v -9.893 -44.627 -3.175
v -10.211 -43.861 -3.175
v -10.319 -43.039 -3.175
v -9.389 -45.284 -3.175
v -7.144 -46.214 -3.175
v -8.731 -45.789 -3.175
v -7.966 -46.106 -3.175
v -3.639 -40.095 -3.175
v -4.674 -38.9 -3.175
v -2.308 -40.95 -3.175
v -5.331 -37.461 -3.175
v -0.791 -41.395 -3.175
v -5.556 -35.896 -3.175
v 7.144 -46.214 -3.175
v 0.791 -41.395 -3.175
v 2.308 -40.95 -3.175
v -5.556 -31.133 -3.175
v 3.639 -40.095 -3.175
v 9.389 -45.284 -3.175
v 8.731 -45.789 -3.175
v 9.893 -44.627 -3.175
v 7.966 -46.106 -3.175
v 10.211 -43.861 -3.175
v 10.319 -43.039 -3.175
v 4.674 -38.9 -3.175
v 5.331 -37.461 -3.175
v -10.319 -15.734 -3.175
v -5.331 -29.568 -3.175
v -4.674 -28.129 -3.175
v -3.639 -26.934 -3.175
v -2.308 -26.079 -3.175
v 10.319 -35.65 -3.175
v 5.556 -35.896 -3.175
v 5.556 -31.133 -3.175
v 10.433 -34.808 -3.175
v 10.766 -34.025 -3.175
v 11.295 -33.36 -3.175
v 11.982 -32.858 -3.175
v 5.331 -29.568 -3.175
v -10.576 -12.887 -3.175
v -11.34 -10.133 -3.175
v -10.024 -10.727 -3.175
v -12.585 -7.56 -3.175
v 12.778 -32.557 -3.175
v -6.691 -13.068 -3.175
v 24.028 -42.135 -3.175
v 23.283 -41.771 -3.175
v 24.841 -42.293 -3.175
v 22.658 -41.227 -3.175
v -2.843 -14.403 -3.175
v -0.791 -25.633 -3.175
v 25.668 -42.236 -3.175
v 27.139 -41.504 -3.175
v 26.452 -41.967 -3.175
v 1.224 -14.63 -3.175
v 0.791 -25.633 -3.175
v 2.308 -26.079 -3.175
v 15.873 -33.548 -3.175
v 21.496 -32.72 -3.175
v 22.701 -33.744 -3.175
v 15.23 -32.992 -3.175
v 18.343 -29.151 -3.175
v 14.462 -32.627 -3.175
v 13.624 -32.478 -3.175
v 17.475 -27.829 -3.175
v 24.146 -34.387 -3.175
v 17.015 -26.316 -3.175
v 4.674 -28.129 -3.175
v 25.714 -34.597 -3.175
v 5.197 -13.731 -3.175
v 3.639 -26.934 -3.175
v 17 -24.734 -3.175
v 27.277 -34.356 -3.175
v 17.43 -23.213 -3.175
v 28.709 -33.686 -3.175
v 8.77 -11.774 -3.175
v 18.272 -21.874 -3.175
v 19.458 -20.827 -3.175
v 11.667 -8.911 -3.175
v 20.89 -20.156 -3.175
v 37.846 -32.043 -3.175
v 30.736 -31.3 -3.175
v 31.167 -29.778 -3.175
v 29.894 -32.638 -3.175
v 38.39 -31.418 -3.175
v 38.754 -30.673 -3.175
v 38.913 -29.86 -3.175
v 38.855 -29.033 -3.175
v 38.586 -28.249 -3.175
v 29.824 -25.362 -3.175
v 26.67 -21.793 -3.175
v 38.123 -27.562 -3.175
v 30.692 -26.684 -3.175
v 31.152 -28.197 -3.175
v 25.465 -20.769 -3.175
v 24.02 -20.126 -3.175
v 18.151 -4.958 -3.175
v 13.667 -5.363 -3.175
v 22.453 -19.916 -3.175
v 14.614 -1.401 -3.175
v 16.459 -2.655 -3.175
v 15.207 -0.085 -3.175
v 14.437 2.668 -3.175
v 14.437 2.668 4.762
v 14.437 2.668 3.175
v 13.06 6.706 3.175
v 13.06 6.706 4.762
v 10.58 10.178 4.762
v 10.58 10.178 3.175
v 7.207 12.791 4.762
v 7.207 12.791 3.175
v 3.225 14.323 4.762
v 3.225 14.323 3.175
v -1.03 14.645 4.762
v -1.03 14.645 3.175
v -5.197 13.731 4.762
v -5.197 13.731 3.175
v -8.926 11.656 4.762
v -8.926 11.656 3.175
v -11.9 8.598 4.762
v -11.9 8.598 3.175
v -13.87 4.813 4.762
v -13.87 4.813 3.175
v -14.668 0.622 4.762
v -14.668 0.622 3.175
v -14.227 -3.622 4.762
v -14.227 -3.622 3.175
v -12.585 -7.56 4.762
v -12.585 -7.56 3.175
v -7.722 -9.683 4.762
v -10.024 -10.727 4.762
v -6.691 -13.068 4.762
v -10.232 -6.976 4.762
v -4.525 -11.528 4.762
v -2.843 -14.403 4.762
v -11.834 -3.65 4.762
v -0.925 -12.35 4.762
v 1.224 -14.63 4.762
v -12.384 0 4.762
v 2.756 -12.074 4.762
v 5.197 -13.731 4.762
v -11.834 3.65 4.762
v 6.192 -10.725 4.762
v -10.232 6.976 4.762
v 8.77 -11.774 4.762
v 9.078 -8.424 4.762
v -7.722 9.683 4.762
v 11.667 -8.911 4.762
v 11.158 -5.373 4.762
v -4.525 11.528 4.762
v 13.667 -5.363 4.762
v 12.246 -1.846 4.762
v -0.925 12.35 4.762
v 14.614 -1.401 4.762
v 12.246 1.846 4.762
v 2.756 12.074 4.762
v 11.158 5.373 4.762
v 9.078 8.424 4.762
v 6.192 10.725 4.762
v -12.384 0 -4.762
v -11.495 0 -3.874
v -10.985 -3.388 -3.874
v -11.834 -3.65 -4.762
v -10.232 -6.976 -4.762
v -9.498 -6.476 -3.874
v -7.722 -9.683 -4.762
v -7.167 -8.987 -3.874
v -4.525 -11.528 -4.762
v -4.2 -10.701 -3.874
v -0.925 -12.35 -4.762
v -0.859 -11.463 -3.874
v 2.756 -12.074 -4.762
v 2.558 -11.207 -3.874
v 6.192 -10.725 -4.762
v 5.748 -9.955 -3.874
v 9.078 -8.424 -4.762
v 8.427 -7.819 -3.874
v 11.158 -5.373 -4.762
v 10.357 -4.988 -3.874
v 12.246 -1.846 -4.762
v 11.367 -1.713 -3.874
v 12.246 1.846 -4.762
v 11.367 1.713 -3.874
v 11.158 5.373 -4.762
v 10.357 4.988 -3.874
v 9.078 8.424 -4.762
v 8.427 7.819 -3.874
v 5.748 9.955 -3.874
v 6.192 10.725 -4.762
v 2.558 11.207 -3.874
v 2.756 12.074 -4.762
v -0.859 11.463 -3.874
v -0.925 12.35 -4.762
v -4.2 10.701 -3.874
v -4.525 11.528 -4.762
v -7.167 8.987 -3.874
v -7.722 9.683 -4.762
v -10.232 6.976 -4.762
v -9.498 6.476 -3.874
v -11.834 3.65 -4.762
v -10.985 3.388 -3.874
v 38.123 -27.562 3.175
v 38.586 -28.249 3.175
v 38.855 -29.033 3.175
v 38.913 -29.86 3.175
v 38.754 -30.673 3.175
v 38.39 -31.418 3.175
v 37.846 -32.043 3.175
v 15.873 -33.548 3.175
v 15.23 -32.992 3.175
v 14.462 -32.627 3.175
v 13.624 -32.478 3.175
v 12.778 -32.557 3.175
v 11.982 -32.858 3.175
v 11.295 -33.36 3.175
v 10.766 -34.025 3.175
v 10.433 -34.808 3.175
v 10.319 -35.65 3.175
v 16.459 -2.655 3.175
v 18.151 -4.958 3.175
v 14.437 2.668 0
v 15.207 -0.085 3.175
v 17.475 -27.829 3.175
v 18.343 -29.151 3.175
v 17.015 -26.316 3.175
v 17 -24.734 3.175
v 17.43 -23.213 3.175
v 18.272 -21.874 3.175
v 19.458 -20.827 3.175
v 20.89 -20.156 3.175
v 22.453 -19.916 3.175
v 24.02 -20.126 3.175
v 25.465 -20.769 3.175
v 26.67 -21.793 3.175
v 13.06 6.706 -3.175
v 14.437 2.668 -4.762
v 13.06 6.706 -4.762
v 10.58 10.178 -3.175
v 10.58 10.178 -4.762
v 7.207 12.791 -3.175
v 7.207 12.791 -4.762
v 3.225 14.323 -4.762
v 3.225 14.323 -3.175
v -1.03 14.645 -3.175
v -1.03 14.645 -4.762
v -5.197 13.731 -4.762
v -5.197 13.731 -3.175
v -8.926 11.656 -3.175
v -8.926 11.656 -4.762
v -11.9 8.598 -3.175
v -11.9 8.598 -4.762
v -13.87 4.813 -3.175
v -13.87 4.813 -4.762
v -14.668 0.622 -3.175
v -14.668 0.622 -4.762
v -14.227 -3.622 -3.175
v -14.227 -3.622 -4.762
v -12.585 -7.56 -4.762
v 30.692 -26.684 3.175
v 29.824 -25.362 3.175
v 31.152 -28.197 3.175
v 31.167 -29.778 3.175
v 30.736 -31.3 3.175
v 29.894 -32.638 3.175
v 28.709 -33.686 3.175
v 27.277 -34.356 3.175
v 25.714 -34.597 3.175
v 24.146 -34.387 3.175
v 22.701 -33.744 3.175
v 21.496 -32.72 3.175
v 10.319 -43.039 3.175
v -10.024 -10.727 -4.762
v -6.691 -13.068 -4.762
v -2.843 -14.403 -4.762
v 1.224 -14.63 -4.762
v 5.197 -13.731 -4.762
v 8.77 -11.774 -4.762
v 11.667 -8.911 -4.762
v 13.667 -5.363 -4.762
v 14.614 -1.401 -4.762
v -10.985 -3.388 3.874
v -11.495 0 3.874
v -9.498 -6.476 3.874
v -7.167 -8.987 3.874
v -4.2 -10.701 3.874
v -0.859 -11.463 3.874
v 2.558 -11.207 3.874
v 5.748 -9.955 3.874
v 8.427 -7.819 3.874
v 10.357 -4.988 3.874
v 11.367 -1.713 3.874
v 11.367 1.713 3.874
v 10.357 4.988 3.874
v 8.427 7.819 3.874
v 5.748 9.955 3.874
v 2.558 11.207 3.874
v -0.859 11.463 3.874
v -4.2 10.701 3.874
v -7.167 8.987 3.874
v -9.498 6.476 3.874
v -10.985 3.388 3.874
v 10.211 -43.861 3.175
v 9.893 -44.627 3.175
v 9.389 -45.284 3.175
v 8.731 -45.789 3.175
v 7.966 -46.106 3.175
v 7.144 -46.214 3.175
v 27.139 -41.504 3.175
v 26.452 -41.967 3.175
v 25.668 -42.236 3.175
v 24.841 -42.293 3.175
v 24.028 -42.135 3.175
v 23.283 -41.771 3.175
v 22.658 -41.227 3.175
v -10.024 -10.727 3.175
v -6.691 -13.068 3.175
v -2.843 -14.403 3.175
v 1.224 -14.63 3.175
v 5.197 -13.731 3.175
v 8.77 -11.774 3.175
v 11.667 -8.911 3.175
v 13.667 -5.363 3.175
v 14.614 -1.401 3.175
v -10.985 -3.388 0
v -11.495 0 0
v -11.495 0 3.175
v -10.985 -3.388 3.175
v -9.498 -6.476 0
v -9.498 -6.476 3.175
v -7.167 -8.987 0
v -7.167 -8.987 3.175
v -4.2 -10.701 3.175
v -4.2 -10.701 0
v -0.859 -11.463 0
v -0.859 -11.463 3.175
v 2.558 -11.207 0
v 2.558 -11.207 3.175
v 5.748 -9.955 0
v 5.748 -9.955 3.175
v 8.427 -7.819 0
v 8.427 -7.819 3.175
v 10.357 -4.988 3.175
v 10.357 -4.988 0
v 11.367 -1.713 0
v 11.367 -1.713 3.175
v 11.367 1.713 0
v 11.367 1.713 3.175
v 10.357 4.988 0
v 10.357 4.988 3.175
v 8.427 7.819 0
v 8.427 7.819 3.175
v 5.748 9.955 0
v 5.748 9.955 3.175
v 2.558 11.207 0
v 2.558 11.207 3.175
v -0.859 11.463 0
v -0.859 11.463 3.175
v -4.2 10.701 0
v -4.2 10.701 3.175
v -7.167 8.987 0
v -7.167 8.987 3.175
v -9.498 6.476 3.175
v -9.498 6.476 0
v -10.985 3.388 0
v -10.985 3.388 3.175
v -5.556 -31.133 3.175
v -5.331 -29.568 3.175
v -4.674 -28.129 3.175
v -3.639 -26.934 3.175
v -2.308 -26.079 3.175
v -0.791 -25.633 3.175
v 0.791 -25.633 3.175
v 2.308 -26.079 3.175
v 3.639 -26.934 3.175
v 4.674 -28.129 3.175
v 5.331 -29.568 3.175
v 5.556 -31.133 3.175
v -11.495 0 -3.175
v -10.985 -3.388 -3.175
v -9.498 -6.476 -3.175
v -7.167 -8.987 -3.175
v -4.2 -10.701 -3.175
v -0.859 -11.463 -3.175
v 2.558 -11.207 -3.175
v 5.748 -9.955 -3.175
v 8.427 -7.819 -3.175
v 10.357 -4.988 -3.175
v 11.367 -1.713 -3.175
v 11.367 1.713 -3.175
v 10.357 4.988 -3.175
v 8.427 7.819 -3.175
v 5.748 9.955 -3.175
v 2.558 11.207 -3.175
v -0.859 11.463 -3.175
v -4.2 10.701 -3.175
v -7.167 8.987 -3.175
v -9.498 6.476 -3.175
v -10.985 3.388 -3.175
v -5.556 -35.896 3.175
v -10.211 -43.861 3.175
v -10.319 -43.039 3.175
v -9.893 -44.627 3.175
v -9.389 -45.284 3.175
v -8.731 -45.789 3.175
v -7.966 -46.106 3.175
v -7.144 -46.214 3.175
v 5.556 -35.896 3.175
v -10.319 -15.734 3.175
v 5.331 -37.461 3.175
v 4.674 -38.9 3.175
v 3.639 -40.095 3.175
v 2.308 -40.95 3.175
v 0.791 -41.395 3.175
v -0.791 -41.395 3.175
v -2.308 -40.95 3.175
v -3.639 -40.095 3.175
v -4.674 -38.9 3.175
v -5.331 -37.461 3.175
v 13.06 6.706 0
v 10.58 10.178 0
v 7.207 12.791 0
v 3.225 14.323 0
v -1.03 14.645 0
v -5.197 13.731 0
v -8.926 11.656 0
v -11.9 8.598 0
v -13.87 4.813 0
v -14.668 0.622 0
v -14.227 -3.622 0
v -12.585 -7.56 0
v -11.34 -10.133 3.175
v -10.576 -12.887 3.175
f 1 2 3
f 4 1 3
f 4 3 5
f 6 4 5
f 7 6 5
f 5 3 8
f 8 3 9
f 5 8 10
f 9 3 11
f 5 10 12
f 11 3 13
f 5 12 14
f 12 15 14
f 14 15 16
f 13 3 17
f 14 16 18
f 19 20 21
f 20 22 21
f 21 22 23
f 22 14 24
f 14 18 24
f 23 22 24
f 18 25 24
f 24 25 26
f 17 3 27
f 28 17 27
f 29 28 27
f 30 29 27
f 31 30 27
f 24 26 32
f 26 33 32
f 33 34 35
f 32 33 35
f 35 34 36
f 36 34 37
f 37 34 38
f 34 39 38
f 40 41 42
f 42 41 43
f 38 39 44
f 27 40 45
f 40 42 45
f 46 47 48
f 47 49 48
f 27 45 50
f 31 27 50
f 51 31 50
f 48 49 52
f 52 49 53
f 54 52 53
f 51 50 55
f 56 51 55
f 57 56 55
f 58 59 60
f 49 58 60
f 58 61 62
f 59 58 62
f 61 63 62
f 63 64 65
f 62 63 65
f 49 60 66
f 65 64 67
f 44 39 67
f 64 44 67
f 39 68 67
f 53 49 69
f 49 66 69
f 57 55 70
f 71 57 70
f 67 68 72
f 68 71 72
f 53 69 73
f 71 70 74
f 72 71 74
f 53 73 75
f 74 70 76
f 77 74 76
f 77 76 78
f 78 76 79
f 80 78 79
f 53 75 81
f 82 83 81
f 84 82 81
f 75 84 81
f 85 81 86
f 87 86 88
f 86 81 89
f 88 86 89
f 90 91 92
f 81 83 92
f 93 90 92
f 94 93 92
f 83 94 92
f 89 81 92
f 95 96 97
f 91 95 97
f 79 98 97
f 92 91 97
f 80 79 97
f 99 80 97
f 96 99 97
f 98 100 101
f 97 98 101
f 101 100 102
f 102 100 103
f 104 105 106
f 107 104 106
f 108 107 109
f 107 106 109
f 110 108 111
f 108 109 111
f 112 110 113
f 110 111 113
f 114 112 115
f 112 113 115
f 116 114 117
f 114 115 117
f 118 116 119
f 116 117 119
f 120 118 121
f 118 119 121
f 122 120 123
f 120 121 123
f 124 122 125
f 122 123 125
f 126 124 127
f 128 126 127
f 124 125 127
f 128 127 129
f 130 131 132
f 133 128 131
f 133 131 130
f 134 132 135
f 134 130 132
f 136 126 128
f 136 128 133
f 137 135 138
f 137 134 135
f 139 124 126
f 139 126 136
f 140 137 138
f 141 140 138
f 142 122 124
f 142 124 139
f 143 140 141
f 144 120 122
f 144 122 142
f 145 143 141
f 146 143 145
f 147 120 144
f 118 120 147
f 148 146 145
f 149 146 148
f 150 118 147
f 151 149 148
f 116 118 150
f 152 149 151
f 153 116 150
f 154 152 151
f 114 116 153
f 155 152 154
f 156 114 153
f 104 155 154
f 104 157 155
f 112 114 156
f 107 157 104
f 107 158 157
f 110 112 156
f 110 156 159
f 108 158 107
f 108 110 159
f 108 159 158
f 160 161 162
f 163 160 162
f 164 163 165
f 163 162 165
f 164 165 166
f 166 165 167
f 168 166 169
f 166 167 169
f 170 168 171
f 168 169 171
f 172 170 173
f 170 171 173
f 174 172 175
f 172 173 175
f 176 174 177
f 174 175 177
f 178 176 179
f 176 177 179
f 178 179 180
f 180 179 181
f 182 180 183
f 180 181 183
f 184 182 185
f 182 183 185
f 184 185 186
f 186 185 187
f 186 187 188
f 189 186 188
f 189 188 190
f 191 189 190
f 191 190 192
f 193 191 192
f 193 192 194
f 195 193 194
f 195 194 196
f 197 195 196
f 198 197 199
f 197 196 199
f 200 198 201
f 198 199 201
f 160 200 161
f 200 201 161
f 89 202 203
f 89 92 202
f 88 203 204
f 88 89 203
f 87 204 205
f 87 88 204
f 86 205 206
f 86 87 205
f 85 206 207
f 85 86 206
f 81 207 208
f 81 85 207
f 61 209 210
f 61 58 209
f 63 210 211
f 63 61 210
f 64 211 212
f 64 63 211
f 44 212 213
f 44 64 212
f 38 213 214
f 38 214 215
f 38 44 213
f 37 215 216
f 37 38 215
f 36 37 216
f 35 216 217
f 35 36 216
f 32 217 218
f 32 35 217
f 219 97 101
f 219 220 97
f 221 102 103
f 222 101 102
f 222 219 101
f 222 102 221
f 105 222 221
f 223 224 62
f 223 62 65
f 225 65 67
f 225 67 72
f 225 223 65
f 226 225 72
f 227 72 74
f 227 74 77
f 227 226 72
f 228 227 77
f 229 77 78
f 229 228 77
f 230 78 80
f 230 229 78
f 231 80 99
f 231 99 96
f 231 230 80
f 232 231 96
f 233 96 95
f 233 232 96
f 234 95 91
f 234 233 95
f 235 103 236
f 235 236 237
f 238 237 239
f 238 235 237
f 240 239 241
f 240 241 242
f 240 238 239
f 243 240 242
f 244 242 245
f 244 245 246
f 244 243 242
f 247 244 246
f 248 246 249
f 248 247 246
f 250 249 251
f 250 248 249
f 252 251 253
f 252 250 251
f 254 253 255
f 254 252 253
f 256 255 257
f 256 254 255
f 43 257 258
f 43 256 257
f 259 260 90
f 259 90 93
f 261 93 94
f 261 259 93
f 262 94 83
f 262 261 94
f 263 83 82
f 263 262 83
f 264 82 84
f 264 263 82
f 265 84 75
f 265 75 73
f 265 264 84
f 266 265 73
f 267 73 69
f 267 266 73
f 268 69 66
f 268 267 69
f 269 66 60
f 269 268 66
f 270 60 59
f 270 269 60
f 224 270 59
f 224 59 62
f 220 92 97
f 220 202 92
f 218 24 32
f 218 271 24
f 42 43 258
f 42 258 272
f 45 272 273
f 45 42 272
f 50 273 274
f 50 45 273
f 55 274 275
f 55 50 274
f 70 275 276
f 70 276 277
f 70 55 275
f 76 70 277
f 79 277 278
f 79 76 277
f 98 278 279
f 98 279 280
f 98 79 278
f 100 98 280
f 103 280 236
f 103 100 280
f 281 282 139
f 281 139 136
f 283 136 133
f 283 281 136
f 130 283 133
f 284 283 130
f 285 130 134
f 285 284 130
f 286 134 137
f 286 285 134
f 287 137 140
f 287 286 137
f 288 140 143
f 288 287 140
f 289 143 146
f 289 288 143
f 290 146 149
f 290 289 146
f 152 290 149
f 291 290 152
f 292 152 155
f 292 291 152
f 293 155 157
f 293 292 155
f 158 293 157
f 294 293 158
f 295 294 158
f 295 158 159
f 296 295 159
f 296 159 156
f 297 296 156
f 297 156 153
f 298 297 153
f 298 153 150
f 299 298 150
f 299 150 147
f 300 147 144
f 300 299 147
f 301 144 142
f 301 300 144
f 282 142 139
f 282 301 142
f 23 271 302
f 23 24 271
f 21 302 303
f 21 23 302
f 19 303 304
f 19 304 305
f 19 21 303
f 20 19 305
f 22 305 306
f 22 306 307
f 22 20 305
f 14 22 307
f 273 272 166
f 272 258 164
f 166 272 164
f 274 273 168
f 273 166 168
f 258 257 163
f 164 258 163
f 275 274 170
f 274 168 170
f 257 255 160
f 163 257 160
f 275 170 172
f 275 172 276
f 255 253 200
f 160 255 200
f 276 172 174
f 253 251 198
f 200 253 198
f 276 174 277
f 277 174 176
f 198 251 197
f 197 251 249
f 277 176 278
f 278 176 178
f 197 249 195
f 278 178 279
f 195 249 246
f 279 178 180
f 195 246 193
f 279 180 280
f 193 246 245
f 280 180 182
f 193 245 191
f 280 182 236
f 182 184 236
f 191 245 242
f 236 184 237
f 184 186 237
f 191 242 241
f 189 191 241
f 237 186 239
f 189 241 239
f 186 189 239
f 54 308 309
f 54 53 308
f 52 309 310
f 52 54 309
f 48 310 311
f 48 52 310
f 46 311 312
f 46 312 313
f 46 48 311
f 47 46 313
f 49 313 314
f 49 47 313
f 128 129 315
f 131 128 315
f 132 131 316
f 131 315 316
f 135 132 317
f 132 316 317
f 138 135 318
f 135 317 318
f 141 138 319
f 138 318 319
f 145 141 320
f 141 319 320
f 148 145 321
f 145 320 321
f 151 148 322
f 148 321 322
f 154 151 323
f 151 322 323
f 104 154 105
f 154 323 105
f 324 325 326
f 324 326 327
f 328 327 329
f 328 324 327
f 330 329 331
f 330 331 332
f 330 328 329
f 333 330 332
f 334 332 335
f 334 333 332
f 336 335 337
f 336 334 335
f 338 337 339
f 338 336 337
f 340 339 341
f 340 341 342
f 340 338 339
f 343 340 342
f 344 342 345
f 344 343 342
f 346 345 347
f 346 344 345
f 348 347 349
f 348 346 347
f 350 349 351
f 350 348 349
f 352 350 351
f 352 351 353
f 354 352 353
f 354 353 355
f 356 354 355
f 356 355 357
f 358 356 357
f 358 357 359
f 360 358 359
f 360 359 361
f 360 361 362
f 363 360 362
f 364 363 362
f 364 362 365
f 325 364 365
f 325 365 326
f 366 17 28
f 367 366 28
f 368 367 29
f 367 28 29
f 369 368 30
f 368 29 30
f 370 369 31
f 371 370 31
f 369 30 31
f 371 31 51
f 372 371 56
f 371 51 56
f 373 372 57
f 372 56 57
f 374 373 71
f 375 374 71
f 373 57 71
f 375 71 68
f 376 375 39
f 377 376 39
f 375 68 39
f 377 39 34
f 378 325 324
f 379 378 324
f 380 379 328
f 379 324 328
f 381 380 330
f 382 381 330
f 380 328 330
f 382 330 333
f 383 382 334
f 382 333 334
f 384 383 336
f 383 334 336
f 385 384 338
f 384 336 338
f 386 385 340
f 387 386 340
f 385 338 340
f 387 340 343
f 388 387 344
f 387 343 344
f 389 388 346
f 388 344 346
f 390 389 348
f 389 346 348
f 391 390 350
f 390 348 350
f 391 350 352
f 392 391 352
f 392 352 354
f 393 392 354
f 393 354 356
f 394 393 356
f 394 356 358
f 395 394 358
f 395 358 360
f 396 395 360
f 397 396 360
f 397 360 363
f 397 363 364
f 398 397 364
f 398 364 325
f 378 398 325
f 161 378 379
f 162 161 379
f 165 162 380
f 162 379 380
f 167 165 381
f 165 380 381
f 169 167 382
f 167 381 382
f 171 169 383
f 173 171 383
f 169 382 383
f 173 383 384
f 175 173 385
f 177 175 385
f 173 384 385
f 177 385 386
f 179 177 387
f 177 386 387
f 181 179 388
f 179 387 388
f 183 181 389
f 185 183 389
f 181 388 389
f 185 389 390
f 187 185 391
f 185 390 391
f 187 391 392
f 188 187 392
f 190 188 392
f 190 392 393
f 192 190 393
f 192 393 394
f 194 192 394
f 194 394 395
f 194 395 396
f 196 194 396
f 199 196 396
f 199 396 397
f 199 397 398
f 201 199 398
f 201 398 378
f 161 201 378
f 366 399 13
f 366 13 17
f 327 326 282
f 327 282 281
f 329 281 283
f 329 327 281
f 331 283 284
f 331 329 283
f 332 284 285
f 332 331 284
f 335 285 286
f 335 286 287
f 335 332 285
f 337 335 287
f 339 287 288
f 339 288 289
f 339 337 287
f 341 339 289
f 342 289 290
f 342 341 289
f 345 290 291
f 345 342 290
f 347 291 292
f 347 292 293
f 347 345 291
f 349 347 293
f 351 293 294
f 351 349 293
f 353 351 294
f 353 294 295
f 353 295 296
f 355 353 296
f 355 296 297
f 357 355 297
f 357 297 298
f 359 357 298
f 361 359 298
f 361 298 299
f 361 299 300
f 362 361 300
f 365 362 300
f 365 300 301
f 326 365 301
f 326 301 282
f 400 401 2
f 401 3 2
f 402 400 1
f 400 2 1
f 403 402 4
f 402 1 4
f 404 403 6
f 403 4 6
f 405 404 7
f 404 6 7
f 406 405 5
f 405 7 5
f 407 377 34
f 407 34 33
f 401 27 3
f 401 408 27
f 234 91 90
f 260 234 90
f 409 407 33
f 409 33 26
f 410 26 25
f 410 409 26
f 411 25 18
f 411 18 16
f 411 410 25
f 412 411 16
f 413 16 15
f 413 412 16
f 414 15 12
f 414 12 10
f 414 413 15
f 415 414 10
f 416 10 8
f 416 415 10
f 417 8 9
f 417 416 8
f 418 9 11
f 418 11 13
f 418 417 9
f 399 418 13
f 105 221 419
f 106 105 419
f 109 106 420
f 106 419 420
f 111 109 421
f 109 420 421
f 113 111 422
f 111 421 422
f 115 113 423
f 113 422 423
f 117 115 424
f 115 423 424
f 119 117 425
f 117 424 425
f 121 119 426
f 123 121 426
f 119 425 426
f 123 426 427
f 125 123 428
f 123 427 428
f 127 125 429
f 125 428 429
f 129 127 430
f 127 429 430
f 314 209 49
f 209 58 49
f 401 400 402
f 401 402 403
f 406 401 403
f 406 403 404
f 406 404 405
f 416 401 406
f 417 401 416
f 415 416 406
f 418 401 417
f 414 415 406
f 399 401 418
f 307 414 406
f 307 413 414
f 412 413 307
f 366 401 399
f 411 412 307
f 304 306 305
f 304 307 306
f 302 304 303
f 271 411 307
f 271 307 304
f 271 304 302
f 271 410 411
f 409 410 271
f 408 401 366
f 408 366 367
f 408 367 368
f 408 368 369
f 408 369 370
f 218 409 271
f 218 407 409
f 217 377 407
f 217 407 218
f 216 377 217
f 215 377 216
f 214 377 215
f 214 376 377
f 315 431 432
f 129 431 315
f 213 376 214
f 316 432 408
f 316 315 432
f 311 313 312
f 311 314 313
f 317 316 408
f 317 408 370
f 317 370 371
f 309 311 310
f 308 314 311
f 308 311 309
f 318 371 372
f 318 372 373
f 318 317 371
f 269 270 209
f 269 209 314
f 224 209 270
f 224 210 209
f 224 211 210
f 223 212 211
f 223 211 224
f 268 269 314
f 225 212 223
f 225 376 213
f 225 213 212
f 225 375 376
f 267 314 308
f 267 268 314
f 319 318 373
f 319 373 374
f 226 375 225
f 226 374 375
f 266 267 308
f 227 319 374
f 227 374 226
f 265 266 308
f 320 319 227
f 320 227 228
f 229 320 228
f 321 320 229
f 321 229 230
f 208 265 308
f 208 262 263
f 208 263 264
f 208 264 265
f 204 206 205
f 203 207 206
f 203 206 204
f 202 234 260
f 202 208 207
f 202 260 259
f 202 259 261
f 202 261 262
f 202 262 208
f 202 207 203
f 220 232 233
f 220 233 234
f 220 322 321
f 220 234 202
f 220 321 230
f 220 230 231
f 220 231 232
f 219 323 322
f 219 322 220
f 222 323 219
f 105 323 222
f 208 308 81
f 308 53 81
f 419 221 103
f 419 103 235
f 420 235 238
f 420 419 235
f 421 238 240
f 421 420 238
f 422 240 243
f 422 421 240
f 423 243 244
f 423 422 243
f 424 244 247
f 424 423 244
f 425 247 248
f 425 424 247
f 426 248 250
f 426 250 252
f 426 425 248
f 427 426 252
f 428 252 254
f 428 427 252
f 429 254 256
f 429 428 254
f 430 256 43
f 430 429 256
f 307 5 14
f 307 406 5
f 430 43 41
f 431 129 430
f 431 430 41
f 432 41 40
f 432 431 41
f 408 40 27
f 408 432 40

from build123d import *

# Parameters (mm, degrees)
SKETCH1_R           = 11.495405
BOSS_EXTRUDE2_DEPTH = 4.7625
BOSS_EXTRUDE3_DEPTH = 3.175
FILLET1_R           = 3.175
CHAMFER1_SIZE       = 0.889


with BuildPart() as part:
    # Sketch1 → Boss-Extrude2 (new, symmetric)
    with BuildSketch(Plane.XY):
        with BuildLine():
            ThreePointArc((14.43672871, 2.668051275), (-5.197044393, 13.730563099), (-12.585193267, -7.559797873))
            ThreePointArc((-12.585193267, -7.559797873), (5.197044393, -13.730563099), (14.43672871, 2.668051275))
        make_face()
        Circle(SKETCH1_R, mode=Mode.SUBTRACT)
    extrude(amount=BOSS_EXTRUDE2_DEPTH, both=True)

    # Sketch1<4> → Boss-Extrude3 (add, symmetric)
    with BuildSketch(Plane.XY):
        with BuildLine():
            ThreePointArc((-12.585193267, -7.559797873), (-10.89585042, -11.492870345), (-10.31875, -15.734319794))
            Line((-10.31875, -15.734319794), (-10.31875, -46.214319794))
            Line((-10.31875, -46.214319794), (10.31875, -46.214319794))
            Line((10.31875, -46.214319794), (10.31875, -27.262081536))
            Line((10.31875, -27.262081536), (24.759911139, -43.605812684))
            Line((24.759911139, -43.605812684), (40.225193096, -29.940840667))
            Line((40.225193096, -29.940840667), (18.15100753, -4.958462121))
            ThreePointArc((18.15100753, -4.958462121), (15.775028495, -1.397891668), (14.43672871, 2.668051275))
            ThreePointArc((14.43672871, 2.668051275), (5.197044393, -13.730563099), (-12.585193267, -7.559797873))
        make_face()
        with BuildLine():
            ThreePointArc((5.55625, -35.895569794), (0, -41.451819794), (-5.55625, -35.895569794))
            Line((-5.55625, -35.895569794), (-5.55625, -31.133069794))
            ThreePointArc((-5.55625, -31.133069794), (0, -25.576819794), (5.55625, -31.133069794))
            Line((5.55625, -31.133069794), (5.55625, -35.895569794))
        make_face(mode=Mode.SUBTRACT)
        with BuildLine():
            ThreePointArc((29.823795866, -25.361654769), (29.339097036, -33.204415455), (21.496336351, -32.719716625))
            Line((21.496336351, -32.719716625), (18.34288127, -29.150805404))
            ThreePointArc((18.34288127, -29.150805404), (18.8275801, -21.308044718), (26.670340785, -21.792743548))
            Line((26.670340785, -21.792743548), (29.823795866, -25.361654769))
        make_face(mode=Mode.SUBTRACT)
    extrude(amount=BOSS_EXTRUDE3_DEPTH, both=True)

    # Fillet1
    fillet1_edges = [part.edges().sort_by_distance(p)[0] for p in [
        (-10.31875, -46.214319794, 0),
        (40.225193096, -29.940840667, 0),
        (10.31875, -27.262081536, 0),
        (24.759911139, -43.605812684, 0),
        (10.31875, -46.214319794, 0),
    ]]
    fillet(fillet1_edges, radius=FILLET1_R)

    # Chamfer1
    chamfer1_edges = [part.edges().sort_by_distance(p)[0] for p in [
        (-11.495405, 0, 4.7625),
        (-11.495405, 0, -4.7625),
    ]]
    chamfer(chamfer1_edges, length=CHAMFER1_SIZE)


solid = part.part
